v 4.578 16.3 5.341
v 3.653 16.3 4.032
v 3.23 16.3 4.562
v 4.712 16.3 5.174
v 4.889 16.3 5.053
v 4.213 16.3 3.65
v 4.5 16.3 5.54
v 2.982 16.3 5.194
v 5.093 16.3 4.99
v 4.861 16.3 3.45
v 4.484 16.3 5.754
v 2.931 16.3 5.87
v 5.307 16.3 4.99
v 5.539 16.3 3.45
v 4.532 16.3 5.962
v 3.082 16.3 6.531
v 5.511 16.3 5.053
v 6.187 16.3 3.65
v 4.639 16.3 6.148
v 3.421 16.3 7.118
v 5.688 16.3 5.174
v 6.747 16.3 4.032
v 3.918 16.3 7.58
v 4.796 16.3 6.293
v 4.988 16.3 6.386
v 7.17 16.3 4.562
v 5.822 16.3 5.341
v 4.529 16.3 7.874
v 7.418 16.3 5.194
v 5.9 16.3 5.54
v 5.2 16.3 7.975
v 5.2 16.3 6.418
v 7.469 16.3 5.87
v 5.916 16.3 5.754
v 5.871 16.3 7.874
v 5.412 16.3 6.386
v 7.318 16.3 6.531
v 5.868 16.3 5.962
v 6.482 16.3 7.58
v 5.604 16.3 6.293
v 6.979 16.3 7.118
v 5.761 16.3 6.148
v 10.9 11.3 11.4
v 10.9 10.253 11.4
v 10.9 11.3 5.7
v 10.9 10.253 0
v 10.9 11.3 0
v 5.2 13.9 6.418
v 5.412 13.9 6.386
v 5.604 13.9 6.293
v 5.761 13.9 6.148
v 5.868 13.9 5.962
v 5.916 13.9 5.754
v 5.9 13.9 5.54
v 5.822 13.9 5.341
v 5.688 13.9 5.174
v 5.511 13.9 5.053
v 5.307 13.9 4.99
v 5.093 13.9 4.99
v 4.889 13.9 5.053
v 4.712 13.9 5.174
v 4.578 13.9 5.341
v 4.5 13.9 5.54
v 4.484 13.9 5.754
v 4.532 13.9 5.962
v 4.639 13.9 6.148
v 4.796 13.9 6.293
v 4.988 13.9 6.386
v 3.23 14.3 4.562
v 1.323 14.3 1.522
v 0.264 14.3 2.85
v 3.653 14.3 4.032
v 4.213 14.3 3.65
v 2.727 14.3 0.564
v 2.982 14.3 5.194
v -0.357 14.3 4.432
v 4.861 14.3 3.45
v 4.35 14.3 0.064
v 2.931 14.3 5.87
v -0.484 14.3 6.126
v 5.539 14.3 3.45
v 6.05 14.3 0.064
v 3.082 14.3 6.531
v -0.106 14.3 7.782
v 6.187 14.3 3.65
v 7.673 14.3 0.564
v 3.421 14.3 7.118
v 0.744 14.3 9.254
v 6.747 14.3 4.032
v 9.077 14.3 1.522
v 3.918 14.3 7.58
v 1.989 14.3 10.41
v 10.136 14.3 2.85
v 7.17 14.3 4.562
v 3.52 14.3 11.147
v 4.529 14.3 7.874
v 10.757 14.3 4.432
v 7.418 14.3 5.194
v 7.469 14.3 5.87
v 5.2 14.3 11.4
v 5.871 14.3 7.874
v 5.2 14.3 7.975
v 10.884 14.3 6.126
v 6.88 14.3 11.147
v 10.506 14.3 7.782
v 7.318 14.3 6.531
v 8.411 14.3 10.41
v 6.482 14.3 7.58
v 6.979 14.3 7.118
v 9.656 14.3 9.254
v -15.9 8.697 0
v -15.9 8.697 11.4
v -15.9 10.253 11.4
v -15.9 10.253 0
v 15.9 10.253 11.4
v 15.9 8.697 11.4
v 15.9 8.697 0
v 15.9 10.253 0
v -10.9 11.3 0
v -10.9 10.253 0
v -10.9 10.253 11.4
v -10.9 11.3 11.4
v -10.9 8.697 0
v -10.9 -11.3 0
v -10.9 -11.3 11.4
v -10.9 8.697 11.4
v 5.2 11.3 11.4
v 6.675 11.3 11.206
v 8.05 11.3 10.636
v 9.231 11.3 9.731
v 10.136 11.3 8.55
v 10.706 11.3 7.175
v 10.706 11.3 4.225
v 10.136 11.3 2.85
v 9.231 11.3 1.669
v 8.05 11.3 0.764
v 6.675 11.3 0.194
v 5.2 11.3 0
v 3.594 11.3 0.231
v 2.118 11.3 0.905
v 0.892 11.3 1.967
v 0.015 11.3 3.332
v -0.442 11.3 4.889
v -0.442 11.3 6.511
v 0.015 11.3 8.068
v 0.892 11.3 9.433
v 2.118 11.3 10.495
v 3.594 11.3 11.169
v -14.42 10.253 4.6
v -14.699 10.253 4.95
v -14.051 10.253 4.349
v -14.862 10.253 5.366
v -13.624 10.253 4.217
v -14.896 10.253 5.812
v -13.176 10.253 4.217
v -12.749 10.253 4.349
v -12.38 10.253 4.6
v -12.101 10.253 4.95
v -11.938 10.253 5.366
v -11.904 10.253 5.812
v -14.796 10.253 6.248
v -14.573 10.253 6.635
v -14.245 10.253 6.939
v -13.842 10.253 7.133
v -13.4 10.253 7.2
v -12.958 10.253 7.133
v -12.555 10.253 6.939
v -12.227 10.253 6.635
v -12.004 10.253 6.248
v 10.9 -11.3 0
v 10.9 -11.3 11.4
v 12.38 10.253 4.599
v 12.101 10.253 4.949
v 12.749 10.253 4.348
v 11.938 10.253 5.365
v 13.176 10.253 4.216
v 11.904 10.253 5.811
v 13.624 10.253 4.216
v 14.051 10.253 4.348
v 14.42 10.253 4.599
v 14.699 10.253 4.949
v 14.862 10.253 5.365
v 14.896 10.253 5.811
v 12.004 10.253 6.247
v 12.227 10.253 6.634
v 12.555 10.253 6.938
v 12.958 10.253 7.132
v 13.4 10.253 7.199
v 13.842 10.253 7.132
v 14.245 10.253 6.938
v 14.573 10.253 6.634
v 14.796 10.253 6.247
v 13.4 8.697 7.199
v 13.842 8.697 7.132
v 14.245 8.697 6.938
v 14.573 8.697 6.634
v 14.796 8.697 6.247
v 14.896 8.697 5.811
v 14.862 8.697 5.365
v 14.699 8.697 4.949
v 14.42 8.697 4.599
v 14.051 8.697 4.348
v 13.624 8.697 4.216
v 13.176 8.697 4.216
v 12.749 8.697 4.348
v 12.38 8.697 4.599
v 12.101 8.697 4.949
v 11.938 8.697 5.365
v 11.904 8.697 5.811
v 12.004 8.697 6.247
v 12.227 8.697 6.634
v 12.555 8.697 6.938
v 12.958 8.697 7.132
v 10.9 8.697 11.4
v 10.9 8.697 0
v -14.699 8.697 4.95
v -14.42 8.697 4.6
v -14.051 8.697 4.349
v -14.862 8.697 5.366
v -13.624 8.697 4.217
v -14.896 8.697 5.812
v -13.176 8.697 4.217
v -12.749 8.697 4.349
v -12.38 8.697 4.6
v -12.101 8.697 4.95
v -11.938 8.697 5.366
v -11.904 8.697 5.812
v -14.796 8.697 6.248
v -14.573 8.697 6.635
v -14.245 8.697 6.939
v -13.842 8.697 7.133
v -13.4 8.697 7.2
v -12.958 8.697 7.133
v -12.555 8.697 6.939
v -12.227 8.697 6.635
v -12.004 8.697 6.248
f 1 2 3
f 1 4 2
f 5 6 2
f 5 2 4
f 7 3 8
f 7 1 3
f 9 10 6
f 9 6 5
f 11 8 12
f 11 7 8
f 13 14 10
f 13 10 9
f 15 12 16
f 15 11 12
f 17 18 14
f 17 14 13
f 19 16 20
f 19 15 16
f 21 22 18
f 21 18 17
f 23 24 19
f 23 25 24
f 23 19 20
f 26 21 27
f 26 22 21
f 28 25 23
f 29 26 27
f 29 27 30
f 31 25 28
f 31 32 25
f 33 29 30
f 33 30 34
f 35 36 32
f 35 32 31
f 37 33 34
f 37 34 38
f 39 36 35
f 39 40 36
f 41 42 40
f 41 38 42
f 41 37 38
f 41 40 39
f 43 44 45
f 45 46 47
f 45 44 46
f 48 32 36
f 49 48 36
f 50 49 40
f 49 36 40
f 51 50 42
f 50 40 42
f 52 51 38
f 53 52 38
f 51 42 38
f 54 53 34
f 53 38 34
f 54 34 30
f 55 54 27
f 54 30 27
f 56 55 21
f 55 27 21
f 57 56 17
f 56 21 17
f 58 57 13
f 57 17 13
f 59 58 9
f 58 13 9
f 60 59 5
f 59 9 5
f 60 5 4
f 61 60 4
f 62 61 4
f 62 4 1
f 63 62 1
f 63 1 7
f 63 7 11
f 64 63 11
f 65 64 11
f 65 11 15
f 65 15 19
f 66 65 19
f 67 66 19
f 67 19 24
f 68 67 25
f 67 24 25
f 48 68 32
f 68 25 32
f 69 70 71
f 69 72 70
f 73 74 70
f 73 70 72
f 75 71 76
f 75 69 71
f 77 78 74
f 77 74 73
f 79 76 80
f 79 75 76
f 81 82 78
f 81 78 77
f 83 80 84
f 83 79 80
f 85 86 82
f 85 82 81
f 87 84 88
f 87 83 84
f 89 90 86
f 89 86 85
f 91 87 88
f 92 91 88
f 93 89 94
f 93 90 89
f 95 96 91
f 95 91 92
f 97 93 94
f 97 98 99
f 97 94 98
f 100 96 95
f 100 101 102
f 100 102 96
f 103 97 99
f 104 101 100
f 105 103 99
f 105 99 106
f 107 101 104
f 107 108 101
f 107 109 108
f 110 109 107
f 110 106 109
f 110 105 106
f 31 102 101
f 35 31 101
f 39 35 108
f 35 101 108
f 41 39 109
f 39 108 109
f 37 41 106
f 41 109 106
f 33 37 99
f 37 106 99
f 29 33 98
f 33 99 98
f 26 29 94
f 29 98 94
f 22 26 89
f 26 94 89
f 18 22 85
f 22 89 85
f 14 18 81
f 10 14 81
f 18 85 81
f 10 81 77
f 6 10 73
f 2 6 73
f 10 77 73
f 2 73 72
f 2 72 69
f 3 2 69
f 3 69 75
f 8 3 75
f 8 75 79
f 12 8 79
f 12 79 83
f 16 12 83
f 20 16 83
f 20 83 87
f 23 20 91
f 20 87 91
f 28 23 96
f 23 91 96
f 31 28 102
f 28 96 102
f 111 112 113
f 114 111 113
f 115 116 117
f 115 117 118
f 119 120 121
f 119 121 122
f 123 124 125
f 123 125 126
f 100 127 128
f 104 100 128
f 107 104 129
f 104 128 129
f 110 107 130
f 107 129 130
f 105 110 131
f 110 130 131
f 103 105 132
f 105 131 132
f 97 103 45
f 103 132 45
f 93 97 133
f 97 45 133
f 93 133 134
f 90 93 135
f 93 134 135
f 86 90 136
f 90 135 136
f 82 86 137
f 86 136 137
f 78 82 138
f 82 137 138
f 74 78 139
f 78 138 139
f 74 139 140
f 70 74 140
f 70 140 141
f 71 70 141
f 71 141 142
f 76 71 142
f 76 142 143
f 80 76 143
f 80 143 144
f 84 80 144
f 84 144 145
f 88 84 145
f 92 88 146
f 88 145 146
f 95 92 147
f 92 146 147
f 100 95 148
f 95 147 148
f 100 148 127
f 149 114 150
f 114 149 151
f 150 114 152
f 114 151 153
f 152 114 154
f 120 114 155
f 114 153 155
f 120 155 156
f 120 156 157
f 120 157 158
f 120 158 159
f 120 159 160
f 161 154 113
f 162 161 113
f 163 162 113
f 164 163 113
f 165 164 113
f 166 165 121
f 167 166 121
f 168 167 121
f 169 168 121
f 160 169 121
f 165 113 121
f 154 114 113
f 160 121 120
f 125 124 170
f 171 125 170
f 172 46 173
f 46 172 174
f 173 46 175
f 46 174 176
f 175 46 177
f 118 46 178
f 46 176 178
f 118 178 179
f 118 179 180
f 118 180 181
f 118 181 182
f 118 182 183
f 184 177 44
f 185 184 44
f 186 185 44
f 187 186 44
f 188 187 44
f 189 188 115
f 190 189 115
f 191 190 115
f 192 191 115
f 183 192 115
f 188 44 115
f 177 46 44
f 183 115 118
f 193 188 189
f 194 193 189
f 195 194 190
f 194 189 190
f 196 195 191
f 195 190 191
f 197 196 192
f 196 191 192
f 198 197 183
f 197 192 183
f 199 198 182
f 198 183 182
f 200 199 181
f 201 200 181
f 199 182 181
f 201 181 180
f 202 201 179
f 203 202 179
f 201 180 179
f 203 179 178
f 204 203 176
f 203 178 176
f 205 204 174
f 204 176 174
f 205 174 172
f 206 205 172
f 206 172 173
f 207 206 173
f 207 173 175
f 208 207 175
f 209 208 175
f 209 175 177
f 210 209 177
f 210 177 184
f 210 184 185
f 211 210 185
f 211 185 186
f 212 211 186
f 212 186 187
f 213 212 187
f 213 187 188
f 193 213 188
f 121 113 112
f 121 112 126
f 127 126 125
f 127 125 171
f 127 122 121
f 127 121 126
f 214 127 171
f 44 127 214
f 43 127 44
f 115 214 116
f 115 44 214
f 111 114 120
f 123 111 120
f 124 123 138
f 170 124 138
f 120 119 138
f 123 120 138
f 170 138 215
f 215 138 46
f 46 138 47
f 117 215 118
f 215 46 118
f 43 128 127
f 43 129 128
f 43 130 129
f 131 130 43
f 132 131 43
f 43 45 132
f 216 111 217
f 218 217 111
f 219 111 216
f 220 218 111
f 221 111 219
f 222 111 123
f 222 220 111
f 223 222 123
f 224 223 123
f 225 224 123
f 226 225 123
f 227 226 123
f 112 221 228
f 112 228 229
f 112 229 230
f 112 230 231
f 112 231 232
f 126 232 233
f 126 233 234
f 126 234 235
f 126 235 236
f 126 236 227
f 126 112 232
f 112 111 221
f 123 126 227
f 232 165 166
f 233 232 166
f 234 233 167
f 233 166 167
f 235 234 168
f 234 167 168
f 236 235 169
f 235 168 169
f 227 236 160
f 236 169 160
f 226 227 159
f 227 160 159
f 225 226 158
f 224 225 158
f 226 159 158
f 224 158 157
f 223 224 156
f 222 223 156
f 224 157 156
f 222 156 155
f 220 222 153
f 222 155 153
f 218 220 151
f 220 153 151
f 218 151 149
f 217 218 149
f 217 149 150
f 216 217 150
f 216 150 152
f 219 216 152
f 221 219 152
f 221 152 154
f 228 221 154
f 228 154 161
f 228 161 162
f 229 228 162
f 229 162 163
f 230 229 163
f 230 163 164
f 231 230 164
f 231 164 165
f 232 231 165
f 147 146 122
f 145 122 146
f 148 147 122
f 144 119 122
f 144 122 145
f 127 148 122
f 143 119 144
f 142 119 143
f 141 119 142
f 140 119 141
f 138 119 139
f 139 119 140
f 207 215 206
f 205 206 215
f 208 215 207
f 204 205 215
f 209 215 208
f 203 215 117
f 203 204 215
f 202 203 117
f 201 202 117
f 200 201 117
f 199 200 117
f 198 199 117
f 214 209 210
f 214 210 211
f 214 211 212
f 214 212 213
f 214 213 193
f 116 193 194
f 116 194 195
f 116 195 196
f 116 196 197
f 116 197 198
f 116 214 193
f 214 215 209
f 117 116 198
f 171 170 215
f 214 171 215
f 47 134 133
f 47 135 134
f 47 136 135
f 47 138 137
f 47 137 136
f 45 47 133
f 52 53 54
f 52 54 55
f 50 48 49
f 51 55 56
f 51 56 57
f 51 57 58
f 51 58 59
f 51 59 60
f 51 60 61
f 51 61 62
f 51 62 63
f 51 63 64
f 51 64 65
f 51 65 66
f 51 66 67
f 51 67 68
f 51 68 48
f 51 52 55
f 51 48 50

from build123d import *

# Parameters (mm, degrees)
SKETCH1_W           = 21.8
SKETCH1_H           = 22.6
BOSS_EXTRUDE1_DEPTH = 11.4
SKETCH2_W           = 31.8
SKETCH2_H           = 1.555593414
BOSS_EXTRUDE2_DEPTH = 11.4
SKETCH3_R           = 5.7
BOSS_EXTRUDE3_DEPTH = 3
SKETCH4_R           = 2.275
BOSS_EXTRUDE4_DEPTH = 2
SKETCH5_R           = 0.717779634
CUT_EXTRUDE1_DEPTH  = 2.4
SKETCH7_R           = 1.5
CUT_EXTRUDE2_DEPTH  = 10


with BuildPart() as part:
    # Sketch1 → Boss-Extrude1 (new body)
    with BuildSketch(Plane.XY):
        Rectangle(SKETCH1_W, SKETCH1_H)
    extrude(amount=BOSS_EXTRUDE1_DEPTH)

    # Sketch2 → Boss-Extrude2 (add)
    with BuildSketch(Plane.XY.offset(11.4)):
        with Locations((0, 9.475117961)):
            Rectangle(SKETCH2_W, SKETCH2_H)
    extrude(amount=-BOSS_EXTRUDE2_DEPTH)

    # Sketch3 → Boss-Extrude3 (add)
    with BuildSketch(Plane(origin=(0, 11.3, 0), x_dir=(1, 0, 0), z_dir=(0, 1, 0))):
        with Locations(Location((5.2, -5.7, 0), (0, 0, 270))):
            Circle(SKETCH3_R)
    extrude(amount=BOSS_EXTRUDE3_DEPTH)

    # Sketch4 → Boss-Extrude4 (add)
    with BuildSketch(Plane(origin=(0, 14.3, 0), x_dir=(1, 0, 0), z_dir=(0, 1, 0))):
        with Locations(Location((5.2, -5.7, 0), (0, 0, 270))):
            Circle(SKETCH4_R)
    extrude(amount=BOSS_EXTRUDE4_DEPTH)

    # Sketch5 → Cut-Extrude1 (cut)
    with BuildSketch(Plane(origin=(0, 16.3, 0), x_dir=(1, 0, 0), z_dir=(0, 1, 0))):
        with Locations(Location((5.2, -5.7, 0), (0, 0, 270))):
            Circle(SKETCH5_R)
    extrude(amount=-CUT_EXTRUDE1_DEPTH, mode=Mode.SUBTRACT)

    # Sketch7 → Cut-Extrude2 (cut)
    with BuildSketch(Plane(origin=(0, 10.252914668, 0), x_dir=(1, 0, 0), z_dir=(0, 1, 0))):
        with Locations(Location((13.399999972, -5.699036205, 0), (0, 0, 270))):
            Circle(SKETCH7_R)
        with Locations(Location((-13.4, -5.7, 0), (0, 0, 270))):
            Circle(SKETCH7_R)
    extrude(amount=-CUT_EXTRUDE2_DEPTH, mode=Mode.SUBTRACT)


solid = part.part
